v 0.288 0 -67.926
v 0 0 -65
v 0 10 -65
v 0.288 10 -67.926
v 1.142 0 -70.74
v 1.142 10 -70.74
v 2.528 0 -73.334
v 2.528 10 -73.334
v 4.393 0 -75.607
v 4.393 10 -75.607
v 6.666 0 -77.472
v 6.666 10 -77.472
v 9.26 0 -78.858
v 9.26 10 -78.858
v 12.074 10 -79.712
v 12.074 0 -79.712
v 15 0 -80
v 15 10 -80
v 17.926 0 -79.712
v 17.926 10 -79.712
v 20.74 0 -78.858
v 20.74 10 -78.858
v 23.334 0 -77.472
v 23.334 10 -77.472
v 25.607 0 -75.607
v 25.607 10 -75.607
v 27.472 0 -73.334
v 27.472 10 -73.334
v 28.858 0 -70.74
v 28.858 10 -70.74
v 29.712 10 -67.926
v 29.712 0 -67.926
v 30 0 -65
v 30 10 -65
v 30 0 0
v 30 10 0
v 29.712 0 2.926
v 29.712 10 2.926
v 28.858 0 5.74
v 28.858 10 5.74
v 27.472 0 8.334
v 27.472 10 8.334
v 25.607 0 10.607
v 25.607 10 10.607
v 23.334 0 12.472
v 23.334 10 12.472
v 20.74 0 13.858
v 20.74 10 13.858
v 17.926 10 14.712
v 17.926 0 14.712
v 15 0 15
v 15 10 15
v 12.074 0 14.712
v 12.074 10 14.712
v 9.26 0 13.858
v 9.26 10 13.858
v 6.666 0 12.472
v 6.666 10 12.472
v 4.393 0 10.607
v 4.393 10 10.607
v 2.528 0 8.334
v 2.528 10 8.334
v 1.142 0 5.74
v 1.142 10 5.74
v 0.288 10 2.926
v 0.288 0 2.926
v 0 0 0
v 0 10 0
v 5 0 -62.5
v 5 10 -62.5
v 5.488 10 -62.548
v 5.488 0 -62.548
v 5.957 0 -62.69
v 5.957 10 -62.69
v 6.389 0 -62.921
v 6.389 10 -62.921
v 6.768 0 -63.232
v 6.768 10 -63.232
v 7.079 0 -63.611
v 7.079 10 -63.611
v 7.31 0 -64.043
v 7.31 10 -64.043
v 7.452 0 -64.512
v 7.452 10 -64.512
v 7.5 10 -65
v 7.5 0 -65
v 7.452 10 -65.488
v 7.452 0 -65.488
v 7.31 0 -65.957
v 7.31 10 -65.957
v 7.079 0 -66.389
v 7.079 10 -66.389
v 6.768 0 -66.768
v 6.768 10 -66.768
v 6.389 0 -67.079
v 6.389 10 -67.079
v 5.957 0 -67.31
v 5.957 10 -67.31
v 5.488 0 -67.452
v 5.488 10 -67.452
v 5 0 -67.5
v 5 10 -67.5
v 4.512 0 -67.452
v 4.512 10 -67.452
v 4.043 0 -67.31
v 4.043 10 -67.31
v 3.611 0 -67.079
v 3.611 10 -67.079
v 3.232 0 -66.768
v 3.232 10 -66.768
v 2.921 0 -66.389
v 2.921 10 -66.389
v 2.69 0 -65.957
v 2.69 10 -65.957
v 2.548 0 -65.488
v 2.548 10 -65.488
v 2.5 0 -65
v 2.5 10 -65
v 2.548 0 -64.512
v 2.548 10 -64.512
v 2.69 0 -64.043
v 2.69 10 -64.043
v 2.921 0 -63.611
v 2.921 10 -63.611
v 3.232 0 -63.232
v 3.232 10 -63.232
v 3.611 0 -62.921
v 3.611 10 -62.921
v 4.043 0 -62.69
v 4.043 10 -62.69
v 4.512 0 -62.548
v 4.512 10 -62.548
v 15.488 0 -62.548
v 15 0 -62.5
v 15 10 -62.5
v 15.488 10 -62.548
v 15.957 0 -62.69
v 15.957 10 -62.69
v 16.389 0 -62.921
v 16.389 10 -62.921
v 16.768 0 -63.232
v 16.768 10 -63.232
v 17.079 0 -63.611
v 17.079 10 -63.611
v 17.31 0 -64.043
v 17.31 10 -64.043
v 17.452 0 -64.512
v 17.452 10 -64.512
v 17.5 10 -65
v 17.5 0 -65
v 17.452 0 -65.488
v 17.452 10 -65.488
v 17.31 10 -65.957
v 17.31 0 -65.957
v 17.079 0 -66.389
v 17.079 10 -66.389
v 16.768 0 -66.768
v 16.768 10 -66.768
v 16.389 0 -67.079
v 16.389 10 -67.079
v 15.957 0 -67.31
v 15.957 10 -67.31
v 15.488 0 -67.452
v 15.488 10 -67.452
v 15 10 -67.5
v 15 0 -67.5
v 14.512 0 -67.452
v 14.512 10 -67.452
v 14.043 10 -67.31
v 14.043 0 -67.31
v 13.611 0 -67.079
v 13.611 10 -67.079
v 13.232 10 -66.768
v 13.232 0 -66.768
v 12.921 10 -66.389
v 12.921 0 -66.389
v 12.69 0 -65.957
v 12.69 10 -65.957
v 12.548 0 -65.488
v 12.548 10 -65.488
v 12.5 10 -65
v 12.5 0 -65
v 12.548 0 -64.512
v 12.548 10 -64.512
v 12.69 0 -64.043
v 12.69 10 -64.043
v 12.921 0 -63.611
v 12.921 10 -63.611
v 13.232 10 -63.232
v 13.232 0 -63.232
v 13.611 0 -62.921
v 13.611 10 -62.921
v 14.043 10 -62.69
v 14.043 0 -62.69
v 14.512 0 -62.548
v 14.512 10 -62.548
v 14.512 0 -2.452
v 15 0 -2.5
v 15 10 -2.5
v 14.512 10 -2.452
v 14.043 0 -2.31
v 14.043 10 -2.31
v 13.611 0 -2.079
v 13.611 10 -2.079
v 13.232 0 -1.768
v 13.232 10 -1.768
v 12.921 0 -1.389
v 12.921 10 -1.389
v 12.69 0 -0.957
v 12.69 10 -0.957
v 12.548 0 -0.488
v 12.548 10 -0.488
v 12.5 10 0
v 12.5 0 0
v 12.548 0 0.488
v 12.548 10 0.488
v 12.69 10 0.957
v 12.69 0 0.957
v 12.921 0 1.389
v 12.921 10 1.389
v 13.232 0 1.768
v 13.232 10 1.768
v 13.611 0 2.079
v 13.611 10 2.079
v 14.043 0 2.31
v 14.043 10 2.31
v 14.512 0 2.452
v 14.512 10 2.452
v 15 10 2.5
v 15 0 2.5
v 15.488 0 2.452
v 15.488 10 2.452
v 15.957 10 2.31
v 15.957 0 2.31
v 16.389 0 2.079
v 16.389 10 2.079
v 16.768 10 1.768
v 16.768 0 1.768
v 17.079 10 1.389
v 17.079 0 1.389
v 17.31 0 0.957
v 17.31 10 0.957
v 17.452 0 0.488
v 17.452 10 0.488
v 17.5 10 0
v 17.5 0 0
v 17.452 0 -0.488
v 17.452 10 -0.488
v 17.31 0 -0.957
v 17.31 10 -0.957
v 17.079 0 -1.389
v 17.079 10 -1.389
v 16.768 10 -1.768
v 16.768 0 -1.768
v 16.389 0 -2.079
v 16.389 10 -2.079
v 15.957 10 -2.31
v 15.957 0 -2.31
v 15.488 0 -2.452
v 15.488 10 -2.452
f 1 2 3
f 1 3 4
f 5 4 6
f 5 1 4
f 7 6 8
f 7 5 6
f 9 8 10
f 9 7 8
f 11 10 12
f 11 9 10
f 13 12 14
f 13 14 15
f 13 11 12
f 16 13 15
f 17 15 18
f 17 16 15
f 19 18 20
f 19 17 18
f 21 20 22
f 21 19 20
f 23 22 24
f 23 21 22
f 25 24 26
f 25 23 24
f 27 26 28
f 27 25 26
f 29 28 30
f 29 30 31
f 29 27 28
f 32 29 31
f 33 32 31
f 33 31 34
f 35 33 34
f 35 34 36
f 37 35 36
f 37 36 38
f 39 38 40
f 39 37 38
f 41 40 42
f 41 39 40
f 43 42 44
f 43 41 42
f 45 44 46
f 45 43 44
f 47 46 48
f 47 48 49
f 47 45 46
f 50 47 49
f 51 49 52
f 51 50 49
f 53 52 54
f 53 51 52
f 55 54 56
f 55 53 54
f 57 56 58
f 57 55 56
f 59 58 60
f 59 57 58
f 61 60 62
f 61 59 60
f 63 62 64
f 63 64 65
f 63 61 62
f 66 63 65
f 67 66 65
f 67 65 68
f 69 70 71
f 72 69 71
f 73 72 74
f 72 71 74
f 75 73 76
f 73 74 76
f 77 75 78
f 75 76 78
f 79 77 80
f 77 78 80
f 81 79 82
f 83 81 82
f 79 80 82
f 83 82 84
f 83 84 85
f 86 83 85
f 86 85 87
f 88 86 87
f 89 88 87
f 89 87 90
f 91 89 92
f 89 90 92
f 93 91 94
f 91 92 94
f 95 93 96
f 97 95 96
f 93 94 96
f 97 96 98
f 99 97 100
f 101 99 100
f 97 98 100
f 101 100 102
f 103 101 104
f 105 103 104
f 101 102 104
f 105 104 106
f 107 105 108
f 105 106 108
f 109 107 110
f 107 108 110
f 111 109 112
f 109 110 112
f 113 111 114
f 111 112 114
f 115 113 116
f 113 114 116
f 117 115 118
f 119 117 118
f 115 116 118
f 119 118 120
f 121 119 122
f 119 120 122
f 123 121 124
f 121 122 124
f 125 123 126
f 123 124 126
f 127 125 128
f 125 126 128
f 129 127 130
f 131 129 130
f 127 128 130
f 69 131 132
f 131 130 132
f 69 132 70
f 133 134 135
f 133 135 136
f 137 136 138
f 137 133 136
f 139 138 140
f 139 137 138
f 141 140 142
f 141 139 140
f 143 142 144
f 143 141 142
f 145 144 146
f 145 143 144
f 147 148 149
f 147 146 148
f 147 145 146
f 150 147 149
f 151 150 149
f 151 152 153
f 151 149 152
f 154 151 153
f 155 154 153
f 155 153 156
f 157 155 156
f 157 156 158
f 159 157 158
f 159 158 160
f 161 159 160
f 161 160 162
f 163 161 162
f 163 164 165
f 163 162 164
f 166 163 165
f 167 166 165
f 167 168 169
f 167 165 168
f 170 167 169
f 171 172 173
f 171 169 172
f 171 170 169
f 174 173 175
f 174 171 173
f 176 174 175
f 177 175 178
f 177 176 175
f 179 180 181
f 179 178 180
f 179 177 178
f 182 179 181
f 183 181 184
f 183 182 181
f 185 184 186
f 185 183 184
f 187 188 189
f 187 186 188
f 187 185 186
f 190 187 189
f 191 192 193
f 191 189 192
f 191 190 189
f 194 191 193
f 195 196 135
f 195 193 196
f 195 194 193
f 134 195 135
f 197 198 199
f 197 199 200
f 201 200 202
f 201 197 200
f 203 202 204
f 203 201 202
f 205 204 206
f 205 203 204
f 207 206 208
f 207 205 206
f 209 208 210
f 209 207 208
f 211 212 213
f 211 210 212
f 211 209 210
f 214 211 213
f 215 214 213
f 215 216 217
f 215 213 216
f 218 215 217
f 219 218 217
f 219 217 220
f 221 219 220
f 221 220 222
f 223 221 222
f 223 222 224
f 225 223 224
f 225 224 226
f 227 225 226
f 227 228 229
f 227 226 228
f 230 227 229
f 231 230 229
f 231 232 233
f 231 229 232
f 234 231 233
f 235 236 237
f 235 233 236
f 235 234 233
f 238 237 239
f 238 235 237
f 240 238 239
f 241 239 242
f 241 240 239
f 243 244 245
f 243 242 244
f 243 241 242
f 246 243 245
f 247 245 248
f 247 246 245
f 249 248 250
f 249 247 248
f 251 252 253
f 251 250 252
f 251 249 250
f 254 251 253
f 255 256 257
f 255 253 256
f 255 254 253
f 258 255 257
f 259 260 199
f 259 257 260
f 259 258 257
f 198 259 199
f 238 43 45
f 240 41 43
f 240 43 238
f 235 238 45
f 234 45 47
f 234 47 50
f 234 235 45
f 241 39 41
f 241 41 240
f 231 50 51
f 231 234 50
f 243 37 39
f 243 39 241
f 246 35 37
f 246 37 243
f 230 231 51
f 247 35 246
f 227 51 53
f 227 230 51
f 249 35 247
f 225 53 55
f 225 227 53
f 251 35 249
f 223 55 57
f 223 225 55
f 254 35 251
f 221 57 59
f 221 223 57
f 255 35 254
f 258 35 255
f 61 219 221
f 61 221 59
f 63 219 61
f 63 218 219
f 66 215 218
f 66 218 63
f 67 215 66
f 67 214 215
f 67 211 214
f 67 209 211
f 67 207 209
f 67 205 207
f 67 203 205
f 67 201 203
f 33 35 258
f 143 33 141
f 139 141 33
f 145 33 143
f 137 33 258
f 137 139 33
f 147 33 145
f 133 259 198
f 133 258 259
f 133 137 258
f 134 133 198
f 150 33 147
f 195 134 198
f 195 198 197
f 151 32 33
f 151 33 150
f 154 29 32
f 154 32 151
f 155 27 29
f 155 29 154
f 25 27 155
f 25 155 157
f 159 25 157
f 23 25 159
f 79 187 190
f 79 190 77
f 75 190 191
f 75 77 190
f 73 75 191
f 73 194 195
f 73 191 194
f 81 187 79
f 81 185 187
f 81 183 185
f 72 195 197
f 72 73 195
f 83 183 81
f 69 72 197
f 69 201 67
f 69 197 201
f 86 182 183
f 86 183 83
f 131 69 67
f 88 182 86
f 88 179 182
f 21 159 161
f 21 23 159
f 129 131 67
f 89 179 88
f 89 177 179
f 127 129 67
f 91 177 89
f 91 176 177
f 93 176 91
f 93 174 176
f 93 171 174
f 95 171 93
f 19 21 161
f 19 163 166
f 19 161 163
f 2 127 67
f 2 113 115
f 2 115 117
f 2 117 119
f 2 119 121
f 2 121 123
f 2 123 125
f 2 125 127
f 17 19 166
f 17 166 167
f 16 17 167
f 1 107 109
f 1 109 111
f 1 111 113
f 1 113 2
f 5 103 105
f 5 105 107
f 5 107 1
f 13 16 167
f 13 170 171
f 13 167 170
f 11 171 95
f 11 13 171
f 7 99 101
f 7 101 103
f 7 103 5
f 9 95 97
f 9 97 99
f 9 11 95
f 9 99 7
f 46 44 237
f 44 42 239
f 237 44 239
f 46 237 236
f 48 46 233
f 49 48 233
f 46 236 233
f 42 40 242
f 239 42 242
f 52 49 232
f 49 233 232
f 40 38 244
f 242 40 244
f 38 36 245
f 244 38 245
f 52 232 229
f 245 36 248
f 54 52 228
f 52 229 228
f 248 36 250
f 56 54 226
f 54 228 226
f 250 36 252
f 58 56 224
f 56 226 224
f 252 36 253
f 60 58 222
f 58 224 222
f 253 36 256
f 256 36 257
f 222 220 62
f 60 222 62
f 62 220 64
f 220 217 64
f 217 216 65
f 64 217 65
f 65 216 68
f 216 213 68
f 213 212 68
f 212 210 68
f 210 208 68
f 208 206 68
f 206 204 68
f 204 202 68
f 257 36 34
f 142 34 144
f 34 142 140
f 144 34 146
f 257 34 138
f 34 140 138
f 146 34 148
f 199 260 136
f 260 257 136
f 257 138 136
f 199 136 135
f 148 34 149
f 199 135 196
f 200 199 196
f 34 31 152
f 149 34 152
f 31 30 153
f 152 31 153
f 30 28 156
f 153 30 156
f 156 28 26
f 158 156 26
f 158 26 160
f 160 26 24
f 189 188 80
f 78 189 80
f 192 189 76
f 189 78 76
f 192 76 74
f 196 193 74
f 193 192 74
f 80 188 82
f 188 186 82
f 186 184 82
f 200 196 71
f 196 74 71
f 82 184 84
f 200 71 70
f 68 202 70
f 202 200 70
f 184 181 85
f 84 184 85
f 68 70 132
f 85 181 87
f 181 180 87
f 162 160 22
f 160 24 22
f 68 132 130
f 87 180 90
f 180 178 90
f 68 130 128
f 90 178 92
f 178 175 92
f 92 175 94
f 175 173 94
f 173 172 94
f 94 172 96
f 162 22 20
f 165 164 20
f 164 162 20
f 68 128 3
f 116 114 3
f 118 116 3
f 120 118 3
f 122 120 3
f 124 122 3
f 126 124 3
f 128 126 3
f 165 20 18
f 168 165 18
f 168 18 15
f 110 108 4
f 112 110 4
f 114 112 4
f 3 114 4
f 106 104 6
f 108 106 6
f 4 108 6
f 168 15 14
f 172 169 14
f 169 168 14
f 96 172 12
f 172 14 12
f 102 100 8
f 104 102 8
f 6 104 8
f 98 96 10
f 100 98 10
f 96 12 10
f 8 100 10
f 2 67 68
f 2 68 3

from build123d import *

# Parameters (mm, degrees)
EXTRUDE_1_DEPTH          = 10
CUT_EXTRUDE_1_DEPTH      = 87.02325267
CUT_EXTRUDE_1_DEPTH_BACK = 87.02325267
SKETCH_2_R               = 2.5
SKETCH_4_R               = 2.5
CUT_EXTRUDE_3_DEPTH      = 10


with BuildPart() as part:
    # 草图1 → 凸台-拉伸1 (new body)
    with BuildSketch(Plane(origin=(0, 0, 0), x_dir=(1, 0, 0), z_dir=(0, 1, 0))):
        with BuildLine():
            Line((0, 0), (0, 65))
            ThreePointArc((0, 65), (15, 80), (30, 65))
            Line((30, 65), (30, 0))
            ThreePointArc((30, 0), (15, -15), (0, 0))
        make_face()
    extrude(amount=EXTRUDE_1_DEPTH)

    # 草图2 → 切除-拉伸1 (cut, two sides: drawn at the far end of the back side and taken through both)
    with BuildSketch(Plane(origin=(0, 10, 0), x_dir=(1, 0, 0), z_dir=(0, 1, 0)).offset(-CUT_EXTRUDE_1_DEPTH_BACK)):
        with Locations(Location((15, 65, 0), (0, 0, 270))):
            Circle(SKETCH_2_R)
        with Locations(Location((15, 0, 0), (0, 0, 90))):
            Circle(SKETCH_2_R)
    extrude(amount=CUT_EXTRUDE_1_DEPTH + CUT_EXTRUDE_1_DEPTH_BACK, mode=Mode.SUBTRACT)

    # 草图4 → 切除-拉伸3 (cut)
    with BuildSketch(Plane(origin=(0, 10, 0), x_dir=(1, 0, 0), z_dir=(0, 1, 0))):
        with Locations(Location((5, 65, 0), (0, 0, 270))):
            Circle(SKETCH_4_R)
    extrude(amount=-CUT_EXTRUDE_3_DEPTH, mode=Mode.SUBTRACT)


solid = part.part
